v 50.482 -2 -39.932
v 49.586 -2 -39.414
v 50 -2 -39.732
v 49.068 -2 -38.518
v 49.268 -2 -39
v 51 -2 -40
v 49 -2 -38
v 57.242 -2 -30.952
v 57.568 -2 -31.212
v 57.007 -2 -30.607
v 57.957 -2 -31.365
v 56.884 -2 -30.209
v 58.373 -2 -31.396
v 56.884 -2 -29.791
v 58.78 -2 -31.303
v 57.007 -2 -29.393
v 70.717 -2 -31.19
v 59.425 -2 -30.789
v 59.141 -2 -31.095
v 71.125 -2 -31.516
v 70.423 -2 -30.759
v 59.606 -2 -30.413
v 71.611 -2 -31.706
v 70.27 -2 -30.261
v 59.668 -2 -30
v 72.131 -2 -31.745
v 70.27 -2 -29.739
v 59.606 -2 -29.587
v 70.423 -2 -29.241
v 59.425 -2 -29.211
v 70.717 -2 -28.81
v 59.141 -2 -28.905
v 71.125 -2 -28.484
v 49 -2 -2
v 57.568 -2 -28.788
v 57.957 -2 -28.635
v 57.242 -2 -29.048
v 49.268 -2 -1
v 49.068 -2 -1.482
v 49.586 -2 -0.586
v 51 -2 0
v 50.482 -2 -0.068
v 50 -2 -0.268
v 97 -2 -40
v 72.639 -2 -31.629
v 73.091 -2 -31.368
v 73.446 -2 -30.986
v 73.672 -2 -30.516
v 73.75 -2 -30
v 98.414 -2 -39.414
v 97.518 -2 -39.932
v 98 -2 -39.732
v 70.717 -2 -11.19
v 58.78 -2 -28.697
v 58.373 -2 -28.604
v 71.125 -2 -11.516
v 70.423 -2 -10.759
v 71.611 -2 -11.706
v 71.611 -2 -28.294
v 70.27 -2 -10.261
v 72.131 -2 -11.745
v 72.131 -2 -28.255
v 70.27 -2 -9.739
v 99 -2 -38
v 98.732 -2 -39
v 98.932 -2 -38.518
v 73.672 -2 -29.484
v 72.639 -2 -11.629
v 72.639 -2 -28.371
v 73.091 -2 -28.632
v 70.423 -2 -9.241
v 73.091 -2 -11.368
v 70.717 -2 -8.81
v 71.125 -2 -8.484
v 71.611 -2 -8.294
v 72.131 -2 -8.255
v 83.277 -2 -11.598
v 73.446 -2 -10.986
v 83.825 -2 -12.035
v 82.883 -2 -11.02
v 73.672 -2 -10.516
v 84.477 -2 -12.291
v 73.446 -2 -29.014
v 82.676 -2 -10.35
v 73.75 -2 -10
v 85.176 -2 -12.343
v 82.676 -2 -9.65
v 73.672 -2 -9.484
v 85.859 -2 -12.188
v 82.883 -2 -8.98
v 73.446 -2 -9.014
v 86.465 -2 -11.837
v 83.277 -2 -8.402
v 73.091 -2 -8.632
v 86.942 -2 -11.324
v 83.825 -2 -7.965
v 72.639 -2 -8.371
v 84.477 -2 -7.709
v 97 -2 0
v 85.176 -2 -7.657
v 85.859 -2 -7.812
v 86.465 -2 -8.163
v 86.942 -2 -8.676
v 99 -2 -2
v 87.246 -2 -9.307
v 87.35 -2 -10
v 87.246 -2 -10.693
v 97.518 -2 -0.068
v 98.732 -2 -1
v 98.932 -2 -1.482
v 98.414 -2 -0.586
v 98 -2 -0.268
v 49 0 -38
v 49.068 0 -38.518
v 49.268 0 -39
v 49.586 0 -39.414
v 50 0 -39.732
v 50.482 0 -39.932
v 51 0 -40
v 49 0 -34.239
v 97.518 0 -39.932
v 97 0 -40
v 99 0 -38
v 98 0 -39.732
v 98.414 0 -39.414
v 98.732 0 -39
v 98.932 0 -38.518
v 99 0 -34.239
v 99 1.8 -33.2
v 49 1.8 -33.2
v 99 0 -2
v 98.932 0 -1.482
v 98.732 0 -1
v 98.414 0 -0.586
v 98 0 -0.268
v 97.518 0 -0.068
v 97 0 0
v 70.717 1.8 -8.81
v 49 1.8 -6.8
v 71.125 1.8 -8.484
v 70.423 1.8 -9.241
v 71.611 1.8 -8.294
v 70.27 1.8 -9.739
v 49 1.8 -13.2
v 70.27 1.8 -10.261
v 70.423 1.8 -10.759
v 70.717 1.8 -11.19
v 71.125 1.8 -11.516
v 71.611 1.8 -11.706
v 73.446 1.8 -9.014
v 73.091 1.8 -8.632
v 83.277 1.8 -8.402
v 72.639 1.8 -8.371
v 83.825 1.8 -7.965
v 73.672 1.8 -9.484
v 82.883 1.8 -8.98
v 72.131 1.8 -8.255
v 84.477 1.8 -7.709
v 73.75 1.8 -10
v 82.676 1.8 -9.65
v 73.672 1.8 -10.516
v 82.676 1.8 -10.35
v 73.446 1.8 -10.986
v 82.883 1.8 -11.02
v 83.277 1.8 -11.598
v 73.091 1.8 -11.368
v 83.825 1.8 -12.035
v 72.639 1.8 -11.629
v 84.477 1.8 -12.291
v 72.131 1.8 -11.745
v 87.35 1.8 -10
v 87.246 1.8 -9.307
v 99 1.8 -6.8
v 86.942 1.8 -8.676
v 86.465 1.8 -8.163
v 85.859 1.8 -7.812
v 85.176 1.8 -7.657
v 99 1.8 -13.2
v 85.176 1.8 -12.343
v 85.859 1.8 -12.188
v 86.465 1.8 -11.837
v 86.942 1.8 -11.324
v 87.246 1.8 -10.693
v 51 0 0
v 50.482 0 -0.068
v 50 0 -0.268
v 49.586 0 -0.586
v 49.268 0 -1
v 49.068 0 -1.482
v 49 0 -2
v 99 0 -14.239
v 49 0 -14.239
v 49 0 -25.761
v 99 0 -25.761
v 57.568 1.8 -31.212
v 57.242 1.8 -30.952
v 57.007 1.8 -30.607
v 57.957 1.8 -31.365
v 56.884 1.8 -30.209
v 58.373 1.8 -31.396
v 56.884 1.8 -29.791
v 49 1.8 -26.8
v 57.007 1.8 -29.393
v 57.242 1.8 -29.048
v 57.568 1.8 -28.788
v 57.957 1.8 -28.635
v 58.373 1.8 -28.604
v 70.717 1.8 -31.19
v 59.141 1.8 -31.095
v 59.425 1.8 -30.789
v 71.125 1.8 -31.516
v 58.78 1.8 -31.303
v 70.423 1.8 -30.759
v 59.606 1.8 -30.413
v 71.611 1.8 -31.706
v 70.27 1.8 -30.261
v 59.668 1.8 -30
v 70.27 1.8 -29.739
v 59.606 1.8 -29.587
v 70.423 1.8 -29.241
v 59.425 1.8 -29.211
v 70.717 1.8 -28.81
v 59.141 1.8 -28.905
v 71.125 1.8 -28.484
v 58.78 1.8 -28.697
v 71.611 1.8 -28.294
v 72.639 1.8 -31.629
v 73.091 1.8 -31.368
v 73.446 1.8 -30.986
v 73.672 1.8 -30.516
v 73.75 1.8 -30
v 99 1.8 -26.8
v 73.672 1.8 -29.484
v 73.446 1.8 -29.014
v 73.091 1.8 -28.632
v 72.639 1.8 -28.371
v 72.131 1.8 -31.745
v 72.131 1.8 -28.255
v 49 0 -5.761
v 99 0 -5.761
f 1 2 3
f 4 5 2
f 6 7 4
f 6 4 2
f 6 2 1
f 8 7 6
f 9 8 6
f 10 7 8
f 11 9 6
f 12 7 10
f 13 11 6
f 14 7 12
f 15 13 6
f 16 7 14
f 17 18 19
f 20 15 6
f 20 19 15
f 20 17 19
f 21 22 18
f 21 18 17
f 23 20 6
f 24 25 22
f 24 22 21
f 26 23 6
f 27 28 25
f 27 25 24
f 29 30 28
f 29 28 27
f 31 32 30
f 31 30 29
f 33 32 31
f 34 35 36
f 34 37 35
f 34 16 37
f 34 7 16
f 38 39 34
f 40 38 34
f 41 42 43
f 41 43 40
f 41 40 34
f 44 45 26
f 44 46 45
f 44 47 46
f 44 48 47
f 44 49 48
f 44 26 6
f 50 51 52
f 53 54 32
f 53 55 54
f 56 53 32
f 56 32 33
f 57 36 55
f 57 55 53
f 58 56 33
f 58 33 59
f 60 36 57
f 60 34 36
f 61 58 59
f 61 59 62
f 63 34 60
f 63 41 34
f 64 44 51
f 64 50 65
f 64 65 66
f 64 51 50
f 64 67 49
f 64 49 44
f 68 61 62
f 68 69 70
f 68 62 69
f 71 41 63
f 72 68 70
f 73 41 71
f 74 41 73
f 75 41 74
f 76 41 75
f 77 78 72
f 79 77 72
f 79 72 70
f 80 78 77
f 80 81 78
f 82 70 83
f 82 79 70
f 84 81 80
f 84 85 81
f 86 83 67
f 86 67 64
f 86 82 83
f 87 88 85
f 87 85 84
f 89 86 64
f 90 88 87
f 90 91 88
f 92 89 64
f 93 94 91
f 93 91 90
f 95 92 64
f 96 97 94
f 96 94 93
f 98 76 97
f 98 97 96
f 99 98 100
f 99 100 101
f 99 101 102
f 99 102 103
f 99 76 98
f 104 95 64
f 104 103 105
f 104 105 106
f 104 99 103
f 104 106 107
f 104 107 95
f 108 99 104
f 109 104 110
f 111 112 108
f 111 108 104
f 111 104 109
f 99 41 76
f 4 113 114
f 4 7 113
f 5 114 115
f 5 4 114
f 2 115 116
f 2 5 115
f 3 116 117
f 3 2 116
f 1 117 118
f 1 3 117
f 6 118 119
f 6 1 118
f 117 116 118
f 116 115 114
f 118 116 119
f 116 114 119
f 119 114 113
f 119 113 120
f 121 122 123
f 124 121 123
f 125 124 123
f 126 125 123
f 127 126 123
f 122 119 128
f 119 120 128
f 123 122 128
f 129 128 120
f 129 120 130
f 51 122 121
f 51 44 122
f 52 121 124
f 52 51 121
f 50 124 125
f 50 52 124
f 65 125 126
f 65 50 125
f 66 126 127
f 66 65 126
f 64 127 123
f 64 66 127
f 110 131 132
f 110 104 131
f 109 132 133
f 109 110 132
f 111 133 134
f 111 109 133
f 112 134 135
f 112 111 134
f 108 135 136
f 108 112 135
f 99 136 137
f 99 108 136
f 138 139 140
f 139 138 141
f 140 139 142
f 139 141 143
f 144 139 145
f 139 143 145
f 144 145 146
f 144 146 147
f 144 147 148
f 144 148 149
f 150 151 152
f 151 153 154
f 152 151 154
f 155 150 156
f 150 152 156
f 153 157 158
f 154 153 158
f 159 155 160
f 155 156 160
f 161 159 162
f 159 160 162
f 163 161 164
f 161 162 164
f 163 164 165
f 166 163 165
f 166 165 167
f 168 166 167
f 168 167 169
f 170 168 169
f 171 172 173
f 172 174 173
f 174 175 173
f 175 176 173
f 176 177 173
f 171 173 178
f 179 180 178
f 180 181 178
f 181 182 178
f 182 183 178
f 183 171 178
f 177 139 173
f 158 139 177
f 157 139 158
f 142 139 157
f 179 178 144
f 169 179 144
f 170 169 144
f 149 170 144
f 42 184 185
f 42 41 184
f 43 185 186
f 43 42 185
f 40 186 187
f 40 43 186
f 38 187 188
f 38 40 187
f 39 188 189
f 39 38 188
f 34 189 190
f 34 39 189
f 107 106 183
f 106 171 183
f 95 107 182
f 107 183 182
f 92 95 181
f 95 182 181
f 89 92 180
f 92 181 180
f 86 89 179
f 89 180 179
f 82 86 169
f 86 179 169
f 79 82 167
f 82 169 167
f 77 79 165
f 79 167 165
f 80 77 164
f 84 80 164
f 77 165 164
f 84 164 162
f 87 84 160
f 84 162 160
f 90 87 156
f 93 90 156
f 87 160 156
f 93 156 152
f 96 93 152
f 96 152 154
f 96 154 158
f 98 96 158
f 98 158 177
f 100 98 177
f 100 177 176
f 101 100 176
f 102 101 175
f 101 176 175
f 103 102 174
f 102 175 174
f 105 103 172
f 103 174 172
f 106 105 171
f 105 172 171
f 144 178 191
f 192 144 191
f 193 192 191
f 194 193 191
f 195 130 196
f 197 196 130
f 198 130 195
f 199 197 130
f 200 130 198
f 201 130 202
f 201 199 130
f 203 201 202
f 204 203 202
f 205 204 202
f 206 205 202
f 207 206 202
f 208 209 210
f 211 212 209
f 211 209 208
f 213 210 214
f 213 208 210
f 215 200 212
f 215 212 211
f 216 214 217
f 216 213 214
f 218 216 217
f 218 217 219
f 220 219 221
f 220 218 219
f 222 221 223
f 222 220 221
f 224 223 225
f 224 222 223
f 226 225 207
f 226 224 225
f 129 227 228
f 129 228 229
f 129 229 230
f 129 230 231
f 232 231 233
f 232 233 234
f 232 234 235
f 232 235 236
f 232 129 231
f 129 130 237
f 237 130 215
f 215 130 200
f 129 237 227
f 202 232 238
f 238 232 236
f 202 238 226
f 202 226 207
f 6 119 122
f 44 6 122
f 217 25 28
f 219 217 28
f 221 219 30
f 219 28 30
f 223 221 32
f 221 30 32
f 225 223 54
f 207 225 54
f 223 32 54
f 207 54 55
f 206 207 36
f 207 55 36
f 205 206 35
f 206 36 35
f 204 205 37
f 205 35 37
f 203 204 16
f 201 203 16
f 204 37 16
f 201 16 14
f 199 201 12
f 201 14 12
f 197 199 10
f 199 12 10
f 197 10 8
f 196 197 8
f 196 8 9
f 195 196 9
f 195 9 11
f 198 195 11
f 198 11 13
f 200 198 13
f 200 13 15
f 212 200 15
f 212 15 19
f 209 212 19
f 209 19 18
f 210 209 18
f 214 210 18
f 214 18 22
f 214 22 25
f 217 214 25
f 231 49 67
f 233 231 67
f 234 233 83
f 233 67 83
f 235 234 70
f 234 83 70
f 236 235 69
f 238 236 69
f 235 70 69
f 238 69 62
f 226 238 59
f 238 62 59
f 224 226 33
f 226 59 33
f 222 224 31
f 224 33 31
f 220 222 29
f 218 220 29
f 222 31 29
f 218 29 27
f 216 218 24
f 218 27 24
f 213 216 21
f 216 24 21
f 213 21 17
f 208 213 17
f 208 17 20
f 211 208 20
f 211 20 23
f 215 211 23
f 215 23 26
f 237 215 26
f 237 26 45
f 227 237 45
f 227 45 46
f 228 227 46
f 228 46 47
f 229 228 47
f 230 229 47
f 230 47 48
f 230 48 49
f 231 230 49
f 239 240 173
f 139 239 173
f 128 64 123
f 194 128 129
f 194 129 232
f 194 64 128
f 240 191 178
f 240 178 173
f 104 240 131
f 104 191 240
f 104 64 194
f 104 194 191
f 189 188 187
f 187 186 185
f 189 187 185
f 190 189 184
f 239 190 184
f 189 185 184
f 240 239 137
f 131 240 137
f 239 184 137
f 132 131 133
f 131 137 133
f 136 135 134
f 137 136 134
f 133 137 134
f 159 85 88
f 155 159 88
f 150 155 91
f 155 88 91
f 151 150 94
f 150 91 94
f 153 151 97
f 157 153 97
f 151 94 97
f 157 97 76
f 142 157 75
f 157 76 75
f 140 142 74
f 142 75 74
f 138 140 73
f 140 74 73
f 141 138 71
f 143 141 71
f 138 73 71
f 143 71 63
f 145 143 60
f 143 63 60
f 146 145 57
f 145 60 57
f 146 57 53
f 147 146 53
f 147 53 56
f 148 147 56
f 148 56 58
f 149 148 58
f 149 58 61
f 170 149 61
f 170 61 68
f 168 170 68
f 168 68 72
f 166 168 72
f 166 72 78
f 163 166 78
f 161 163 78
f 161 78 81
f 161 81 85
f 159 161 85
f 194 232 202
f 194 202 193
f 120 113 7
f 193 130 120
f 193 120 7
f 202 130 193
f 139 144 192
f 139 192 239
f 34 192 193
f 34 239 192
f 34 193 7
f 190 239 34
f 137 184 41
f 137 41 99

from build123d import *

# Parameters (mm, degrees)
SKETCH005_W       = 50
SKETCH005_H       = 40
PAD002_DEPTH      = 2
PAD003_DEPTH      = 50
SKETCH007_R       = 2.35
POCKET_DEPTH      = 15
POCKET_DEPTH_BACK = 100
SKETCH008_R       = 1.4
SKETCH008_R_2     = 1.75
POCKET001_DEPTH   = 5
FILLET004_R       = 2
FILLET005_R       = 2
FILLET006_R       = 2
FILLET007_R       = 2


with BuildPart() as part:
    # Sketch005 → Pad002 (new body)
    with BuildSketch(Plane.XZ):
        with Locations((74, -20)):
            Rectangle(SKETCH005_W, SKETCH005_H)
    extrude(amount=PAD002_DEPTH)

    # Sketch006 (on Face4 of Pad002) → Pad003 (join)
    with BuildSketch(Plane(origin=(99, 0, 0), x_dir=(0, 0, 1), z_dir=(1, 0, 0))):
        Polygon((-34.7, 0.798076), (-33.2, -1.8), (-26.8, -1.8), (-25.3, 0.798076), align=None)
        Polygon((-5.3, 0.798076), (-6.8, -1.8), (-13.2, -1.8), (-14.7, 0.798076), align=None)
    extrude(amount=-PAD003_DEPTH)

    # Sketch007 (on Face4 of Pad003) → Pocket (cut, two sides)
    with BuildSketch(Plane(origin=(0, 0, 0), x_dir=(1, 0, 0), z_dir=(0, 1, 0))) as pocket_sk:
        with Locations((85, 10)):
            Circle(SKETCH007_R)
    extrude(amount=-POCKET_DEPTH, mode=Mode.SUBTRACT)
    extrude(pocket_sk.sketch, amount=POCKET_DEPTH_BACK, mode=Mode.SUBTRACT)

    # Sketch008 (on Face5 of Pocket) → Pocket001 (cut)
    with BuildSketch(Plane.XZ.offset(2)):
        with Locations((58.268055, -30)):
            Circle(SKETCH008_R)
        with Locations((72, -30)):
            Circle(SKETCH008_R_2)
        with Locations((72, -10)):
            Circle(SKETCH008_R_2)
    extrude(amount=-POCKET001_DEPTH, mode=Mode.SUBTRACT)

    # Fillet004
    fillet004_edges = [part.edges().sort_by_distance(p)[0] for p in [
        (49, -1, -40),
    ]]
    fillet(fillet004_edges, radius=FILLET004_R)

    # Fillet005
    fillet005_edges = [part.edges().sort_by_distance(p)[0] for p in [
        (99, -1, -40),
    ]]
    fillet(fillet005_edges, radius=FILLET005_R)

    # Fillet006
    fillet006_edges = [part.edges().sort_by_distance(p)[0] for p in [
        (99, -1, 0),
    ]]
    fillet(fillet006_edges, radius=FILLET006_R)

    # Fillet007
    fillet007_edges = [part.edges().sort_by_distance(p)[0] for p in [
        (49, -1, 0),
    ]]
    fillet(fillet007_edges, radius=FILLET007_R)


solid = part.part
